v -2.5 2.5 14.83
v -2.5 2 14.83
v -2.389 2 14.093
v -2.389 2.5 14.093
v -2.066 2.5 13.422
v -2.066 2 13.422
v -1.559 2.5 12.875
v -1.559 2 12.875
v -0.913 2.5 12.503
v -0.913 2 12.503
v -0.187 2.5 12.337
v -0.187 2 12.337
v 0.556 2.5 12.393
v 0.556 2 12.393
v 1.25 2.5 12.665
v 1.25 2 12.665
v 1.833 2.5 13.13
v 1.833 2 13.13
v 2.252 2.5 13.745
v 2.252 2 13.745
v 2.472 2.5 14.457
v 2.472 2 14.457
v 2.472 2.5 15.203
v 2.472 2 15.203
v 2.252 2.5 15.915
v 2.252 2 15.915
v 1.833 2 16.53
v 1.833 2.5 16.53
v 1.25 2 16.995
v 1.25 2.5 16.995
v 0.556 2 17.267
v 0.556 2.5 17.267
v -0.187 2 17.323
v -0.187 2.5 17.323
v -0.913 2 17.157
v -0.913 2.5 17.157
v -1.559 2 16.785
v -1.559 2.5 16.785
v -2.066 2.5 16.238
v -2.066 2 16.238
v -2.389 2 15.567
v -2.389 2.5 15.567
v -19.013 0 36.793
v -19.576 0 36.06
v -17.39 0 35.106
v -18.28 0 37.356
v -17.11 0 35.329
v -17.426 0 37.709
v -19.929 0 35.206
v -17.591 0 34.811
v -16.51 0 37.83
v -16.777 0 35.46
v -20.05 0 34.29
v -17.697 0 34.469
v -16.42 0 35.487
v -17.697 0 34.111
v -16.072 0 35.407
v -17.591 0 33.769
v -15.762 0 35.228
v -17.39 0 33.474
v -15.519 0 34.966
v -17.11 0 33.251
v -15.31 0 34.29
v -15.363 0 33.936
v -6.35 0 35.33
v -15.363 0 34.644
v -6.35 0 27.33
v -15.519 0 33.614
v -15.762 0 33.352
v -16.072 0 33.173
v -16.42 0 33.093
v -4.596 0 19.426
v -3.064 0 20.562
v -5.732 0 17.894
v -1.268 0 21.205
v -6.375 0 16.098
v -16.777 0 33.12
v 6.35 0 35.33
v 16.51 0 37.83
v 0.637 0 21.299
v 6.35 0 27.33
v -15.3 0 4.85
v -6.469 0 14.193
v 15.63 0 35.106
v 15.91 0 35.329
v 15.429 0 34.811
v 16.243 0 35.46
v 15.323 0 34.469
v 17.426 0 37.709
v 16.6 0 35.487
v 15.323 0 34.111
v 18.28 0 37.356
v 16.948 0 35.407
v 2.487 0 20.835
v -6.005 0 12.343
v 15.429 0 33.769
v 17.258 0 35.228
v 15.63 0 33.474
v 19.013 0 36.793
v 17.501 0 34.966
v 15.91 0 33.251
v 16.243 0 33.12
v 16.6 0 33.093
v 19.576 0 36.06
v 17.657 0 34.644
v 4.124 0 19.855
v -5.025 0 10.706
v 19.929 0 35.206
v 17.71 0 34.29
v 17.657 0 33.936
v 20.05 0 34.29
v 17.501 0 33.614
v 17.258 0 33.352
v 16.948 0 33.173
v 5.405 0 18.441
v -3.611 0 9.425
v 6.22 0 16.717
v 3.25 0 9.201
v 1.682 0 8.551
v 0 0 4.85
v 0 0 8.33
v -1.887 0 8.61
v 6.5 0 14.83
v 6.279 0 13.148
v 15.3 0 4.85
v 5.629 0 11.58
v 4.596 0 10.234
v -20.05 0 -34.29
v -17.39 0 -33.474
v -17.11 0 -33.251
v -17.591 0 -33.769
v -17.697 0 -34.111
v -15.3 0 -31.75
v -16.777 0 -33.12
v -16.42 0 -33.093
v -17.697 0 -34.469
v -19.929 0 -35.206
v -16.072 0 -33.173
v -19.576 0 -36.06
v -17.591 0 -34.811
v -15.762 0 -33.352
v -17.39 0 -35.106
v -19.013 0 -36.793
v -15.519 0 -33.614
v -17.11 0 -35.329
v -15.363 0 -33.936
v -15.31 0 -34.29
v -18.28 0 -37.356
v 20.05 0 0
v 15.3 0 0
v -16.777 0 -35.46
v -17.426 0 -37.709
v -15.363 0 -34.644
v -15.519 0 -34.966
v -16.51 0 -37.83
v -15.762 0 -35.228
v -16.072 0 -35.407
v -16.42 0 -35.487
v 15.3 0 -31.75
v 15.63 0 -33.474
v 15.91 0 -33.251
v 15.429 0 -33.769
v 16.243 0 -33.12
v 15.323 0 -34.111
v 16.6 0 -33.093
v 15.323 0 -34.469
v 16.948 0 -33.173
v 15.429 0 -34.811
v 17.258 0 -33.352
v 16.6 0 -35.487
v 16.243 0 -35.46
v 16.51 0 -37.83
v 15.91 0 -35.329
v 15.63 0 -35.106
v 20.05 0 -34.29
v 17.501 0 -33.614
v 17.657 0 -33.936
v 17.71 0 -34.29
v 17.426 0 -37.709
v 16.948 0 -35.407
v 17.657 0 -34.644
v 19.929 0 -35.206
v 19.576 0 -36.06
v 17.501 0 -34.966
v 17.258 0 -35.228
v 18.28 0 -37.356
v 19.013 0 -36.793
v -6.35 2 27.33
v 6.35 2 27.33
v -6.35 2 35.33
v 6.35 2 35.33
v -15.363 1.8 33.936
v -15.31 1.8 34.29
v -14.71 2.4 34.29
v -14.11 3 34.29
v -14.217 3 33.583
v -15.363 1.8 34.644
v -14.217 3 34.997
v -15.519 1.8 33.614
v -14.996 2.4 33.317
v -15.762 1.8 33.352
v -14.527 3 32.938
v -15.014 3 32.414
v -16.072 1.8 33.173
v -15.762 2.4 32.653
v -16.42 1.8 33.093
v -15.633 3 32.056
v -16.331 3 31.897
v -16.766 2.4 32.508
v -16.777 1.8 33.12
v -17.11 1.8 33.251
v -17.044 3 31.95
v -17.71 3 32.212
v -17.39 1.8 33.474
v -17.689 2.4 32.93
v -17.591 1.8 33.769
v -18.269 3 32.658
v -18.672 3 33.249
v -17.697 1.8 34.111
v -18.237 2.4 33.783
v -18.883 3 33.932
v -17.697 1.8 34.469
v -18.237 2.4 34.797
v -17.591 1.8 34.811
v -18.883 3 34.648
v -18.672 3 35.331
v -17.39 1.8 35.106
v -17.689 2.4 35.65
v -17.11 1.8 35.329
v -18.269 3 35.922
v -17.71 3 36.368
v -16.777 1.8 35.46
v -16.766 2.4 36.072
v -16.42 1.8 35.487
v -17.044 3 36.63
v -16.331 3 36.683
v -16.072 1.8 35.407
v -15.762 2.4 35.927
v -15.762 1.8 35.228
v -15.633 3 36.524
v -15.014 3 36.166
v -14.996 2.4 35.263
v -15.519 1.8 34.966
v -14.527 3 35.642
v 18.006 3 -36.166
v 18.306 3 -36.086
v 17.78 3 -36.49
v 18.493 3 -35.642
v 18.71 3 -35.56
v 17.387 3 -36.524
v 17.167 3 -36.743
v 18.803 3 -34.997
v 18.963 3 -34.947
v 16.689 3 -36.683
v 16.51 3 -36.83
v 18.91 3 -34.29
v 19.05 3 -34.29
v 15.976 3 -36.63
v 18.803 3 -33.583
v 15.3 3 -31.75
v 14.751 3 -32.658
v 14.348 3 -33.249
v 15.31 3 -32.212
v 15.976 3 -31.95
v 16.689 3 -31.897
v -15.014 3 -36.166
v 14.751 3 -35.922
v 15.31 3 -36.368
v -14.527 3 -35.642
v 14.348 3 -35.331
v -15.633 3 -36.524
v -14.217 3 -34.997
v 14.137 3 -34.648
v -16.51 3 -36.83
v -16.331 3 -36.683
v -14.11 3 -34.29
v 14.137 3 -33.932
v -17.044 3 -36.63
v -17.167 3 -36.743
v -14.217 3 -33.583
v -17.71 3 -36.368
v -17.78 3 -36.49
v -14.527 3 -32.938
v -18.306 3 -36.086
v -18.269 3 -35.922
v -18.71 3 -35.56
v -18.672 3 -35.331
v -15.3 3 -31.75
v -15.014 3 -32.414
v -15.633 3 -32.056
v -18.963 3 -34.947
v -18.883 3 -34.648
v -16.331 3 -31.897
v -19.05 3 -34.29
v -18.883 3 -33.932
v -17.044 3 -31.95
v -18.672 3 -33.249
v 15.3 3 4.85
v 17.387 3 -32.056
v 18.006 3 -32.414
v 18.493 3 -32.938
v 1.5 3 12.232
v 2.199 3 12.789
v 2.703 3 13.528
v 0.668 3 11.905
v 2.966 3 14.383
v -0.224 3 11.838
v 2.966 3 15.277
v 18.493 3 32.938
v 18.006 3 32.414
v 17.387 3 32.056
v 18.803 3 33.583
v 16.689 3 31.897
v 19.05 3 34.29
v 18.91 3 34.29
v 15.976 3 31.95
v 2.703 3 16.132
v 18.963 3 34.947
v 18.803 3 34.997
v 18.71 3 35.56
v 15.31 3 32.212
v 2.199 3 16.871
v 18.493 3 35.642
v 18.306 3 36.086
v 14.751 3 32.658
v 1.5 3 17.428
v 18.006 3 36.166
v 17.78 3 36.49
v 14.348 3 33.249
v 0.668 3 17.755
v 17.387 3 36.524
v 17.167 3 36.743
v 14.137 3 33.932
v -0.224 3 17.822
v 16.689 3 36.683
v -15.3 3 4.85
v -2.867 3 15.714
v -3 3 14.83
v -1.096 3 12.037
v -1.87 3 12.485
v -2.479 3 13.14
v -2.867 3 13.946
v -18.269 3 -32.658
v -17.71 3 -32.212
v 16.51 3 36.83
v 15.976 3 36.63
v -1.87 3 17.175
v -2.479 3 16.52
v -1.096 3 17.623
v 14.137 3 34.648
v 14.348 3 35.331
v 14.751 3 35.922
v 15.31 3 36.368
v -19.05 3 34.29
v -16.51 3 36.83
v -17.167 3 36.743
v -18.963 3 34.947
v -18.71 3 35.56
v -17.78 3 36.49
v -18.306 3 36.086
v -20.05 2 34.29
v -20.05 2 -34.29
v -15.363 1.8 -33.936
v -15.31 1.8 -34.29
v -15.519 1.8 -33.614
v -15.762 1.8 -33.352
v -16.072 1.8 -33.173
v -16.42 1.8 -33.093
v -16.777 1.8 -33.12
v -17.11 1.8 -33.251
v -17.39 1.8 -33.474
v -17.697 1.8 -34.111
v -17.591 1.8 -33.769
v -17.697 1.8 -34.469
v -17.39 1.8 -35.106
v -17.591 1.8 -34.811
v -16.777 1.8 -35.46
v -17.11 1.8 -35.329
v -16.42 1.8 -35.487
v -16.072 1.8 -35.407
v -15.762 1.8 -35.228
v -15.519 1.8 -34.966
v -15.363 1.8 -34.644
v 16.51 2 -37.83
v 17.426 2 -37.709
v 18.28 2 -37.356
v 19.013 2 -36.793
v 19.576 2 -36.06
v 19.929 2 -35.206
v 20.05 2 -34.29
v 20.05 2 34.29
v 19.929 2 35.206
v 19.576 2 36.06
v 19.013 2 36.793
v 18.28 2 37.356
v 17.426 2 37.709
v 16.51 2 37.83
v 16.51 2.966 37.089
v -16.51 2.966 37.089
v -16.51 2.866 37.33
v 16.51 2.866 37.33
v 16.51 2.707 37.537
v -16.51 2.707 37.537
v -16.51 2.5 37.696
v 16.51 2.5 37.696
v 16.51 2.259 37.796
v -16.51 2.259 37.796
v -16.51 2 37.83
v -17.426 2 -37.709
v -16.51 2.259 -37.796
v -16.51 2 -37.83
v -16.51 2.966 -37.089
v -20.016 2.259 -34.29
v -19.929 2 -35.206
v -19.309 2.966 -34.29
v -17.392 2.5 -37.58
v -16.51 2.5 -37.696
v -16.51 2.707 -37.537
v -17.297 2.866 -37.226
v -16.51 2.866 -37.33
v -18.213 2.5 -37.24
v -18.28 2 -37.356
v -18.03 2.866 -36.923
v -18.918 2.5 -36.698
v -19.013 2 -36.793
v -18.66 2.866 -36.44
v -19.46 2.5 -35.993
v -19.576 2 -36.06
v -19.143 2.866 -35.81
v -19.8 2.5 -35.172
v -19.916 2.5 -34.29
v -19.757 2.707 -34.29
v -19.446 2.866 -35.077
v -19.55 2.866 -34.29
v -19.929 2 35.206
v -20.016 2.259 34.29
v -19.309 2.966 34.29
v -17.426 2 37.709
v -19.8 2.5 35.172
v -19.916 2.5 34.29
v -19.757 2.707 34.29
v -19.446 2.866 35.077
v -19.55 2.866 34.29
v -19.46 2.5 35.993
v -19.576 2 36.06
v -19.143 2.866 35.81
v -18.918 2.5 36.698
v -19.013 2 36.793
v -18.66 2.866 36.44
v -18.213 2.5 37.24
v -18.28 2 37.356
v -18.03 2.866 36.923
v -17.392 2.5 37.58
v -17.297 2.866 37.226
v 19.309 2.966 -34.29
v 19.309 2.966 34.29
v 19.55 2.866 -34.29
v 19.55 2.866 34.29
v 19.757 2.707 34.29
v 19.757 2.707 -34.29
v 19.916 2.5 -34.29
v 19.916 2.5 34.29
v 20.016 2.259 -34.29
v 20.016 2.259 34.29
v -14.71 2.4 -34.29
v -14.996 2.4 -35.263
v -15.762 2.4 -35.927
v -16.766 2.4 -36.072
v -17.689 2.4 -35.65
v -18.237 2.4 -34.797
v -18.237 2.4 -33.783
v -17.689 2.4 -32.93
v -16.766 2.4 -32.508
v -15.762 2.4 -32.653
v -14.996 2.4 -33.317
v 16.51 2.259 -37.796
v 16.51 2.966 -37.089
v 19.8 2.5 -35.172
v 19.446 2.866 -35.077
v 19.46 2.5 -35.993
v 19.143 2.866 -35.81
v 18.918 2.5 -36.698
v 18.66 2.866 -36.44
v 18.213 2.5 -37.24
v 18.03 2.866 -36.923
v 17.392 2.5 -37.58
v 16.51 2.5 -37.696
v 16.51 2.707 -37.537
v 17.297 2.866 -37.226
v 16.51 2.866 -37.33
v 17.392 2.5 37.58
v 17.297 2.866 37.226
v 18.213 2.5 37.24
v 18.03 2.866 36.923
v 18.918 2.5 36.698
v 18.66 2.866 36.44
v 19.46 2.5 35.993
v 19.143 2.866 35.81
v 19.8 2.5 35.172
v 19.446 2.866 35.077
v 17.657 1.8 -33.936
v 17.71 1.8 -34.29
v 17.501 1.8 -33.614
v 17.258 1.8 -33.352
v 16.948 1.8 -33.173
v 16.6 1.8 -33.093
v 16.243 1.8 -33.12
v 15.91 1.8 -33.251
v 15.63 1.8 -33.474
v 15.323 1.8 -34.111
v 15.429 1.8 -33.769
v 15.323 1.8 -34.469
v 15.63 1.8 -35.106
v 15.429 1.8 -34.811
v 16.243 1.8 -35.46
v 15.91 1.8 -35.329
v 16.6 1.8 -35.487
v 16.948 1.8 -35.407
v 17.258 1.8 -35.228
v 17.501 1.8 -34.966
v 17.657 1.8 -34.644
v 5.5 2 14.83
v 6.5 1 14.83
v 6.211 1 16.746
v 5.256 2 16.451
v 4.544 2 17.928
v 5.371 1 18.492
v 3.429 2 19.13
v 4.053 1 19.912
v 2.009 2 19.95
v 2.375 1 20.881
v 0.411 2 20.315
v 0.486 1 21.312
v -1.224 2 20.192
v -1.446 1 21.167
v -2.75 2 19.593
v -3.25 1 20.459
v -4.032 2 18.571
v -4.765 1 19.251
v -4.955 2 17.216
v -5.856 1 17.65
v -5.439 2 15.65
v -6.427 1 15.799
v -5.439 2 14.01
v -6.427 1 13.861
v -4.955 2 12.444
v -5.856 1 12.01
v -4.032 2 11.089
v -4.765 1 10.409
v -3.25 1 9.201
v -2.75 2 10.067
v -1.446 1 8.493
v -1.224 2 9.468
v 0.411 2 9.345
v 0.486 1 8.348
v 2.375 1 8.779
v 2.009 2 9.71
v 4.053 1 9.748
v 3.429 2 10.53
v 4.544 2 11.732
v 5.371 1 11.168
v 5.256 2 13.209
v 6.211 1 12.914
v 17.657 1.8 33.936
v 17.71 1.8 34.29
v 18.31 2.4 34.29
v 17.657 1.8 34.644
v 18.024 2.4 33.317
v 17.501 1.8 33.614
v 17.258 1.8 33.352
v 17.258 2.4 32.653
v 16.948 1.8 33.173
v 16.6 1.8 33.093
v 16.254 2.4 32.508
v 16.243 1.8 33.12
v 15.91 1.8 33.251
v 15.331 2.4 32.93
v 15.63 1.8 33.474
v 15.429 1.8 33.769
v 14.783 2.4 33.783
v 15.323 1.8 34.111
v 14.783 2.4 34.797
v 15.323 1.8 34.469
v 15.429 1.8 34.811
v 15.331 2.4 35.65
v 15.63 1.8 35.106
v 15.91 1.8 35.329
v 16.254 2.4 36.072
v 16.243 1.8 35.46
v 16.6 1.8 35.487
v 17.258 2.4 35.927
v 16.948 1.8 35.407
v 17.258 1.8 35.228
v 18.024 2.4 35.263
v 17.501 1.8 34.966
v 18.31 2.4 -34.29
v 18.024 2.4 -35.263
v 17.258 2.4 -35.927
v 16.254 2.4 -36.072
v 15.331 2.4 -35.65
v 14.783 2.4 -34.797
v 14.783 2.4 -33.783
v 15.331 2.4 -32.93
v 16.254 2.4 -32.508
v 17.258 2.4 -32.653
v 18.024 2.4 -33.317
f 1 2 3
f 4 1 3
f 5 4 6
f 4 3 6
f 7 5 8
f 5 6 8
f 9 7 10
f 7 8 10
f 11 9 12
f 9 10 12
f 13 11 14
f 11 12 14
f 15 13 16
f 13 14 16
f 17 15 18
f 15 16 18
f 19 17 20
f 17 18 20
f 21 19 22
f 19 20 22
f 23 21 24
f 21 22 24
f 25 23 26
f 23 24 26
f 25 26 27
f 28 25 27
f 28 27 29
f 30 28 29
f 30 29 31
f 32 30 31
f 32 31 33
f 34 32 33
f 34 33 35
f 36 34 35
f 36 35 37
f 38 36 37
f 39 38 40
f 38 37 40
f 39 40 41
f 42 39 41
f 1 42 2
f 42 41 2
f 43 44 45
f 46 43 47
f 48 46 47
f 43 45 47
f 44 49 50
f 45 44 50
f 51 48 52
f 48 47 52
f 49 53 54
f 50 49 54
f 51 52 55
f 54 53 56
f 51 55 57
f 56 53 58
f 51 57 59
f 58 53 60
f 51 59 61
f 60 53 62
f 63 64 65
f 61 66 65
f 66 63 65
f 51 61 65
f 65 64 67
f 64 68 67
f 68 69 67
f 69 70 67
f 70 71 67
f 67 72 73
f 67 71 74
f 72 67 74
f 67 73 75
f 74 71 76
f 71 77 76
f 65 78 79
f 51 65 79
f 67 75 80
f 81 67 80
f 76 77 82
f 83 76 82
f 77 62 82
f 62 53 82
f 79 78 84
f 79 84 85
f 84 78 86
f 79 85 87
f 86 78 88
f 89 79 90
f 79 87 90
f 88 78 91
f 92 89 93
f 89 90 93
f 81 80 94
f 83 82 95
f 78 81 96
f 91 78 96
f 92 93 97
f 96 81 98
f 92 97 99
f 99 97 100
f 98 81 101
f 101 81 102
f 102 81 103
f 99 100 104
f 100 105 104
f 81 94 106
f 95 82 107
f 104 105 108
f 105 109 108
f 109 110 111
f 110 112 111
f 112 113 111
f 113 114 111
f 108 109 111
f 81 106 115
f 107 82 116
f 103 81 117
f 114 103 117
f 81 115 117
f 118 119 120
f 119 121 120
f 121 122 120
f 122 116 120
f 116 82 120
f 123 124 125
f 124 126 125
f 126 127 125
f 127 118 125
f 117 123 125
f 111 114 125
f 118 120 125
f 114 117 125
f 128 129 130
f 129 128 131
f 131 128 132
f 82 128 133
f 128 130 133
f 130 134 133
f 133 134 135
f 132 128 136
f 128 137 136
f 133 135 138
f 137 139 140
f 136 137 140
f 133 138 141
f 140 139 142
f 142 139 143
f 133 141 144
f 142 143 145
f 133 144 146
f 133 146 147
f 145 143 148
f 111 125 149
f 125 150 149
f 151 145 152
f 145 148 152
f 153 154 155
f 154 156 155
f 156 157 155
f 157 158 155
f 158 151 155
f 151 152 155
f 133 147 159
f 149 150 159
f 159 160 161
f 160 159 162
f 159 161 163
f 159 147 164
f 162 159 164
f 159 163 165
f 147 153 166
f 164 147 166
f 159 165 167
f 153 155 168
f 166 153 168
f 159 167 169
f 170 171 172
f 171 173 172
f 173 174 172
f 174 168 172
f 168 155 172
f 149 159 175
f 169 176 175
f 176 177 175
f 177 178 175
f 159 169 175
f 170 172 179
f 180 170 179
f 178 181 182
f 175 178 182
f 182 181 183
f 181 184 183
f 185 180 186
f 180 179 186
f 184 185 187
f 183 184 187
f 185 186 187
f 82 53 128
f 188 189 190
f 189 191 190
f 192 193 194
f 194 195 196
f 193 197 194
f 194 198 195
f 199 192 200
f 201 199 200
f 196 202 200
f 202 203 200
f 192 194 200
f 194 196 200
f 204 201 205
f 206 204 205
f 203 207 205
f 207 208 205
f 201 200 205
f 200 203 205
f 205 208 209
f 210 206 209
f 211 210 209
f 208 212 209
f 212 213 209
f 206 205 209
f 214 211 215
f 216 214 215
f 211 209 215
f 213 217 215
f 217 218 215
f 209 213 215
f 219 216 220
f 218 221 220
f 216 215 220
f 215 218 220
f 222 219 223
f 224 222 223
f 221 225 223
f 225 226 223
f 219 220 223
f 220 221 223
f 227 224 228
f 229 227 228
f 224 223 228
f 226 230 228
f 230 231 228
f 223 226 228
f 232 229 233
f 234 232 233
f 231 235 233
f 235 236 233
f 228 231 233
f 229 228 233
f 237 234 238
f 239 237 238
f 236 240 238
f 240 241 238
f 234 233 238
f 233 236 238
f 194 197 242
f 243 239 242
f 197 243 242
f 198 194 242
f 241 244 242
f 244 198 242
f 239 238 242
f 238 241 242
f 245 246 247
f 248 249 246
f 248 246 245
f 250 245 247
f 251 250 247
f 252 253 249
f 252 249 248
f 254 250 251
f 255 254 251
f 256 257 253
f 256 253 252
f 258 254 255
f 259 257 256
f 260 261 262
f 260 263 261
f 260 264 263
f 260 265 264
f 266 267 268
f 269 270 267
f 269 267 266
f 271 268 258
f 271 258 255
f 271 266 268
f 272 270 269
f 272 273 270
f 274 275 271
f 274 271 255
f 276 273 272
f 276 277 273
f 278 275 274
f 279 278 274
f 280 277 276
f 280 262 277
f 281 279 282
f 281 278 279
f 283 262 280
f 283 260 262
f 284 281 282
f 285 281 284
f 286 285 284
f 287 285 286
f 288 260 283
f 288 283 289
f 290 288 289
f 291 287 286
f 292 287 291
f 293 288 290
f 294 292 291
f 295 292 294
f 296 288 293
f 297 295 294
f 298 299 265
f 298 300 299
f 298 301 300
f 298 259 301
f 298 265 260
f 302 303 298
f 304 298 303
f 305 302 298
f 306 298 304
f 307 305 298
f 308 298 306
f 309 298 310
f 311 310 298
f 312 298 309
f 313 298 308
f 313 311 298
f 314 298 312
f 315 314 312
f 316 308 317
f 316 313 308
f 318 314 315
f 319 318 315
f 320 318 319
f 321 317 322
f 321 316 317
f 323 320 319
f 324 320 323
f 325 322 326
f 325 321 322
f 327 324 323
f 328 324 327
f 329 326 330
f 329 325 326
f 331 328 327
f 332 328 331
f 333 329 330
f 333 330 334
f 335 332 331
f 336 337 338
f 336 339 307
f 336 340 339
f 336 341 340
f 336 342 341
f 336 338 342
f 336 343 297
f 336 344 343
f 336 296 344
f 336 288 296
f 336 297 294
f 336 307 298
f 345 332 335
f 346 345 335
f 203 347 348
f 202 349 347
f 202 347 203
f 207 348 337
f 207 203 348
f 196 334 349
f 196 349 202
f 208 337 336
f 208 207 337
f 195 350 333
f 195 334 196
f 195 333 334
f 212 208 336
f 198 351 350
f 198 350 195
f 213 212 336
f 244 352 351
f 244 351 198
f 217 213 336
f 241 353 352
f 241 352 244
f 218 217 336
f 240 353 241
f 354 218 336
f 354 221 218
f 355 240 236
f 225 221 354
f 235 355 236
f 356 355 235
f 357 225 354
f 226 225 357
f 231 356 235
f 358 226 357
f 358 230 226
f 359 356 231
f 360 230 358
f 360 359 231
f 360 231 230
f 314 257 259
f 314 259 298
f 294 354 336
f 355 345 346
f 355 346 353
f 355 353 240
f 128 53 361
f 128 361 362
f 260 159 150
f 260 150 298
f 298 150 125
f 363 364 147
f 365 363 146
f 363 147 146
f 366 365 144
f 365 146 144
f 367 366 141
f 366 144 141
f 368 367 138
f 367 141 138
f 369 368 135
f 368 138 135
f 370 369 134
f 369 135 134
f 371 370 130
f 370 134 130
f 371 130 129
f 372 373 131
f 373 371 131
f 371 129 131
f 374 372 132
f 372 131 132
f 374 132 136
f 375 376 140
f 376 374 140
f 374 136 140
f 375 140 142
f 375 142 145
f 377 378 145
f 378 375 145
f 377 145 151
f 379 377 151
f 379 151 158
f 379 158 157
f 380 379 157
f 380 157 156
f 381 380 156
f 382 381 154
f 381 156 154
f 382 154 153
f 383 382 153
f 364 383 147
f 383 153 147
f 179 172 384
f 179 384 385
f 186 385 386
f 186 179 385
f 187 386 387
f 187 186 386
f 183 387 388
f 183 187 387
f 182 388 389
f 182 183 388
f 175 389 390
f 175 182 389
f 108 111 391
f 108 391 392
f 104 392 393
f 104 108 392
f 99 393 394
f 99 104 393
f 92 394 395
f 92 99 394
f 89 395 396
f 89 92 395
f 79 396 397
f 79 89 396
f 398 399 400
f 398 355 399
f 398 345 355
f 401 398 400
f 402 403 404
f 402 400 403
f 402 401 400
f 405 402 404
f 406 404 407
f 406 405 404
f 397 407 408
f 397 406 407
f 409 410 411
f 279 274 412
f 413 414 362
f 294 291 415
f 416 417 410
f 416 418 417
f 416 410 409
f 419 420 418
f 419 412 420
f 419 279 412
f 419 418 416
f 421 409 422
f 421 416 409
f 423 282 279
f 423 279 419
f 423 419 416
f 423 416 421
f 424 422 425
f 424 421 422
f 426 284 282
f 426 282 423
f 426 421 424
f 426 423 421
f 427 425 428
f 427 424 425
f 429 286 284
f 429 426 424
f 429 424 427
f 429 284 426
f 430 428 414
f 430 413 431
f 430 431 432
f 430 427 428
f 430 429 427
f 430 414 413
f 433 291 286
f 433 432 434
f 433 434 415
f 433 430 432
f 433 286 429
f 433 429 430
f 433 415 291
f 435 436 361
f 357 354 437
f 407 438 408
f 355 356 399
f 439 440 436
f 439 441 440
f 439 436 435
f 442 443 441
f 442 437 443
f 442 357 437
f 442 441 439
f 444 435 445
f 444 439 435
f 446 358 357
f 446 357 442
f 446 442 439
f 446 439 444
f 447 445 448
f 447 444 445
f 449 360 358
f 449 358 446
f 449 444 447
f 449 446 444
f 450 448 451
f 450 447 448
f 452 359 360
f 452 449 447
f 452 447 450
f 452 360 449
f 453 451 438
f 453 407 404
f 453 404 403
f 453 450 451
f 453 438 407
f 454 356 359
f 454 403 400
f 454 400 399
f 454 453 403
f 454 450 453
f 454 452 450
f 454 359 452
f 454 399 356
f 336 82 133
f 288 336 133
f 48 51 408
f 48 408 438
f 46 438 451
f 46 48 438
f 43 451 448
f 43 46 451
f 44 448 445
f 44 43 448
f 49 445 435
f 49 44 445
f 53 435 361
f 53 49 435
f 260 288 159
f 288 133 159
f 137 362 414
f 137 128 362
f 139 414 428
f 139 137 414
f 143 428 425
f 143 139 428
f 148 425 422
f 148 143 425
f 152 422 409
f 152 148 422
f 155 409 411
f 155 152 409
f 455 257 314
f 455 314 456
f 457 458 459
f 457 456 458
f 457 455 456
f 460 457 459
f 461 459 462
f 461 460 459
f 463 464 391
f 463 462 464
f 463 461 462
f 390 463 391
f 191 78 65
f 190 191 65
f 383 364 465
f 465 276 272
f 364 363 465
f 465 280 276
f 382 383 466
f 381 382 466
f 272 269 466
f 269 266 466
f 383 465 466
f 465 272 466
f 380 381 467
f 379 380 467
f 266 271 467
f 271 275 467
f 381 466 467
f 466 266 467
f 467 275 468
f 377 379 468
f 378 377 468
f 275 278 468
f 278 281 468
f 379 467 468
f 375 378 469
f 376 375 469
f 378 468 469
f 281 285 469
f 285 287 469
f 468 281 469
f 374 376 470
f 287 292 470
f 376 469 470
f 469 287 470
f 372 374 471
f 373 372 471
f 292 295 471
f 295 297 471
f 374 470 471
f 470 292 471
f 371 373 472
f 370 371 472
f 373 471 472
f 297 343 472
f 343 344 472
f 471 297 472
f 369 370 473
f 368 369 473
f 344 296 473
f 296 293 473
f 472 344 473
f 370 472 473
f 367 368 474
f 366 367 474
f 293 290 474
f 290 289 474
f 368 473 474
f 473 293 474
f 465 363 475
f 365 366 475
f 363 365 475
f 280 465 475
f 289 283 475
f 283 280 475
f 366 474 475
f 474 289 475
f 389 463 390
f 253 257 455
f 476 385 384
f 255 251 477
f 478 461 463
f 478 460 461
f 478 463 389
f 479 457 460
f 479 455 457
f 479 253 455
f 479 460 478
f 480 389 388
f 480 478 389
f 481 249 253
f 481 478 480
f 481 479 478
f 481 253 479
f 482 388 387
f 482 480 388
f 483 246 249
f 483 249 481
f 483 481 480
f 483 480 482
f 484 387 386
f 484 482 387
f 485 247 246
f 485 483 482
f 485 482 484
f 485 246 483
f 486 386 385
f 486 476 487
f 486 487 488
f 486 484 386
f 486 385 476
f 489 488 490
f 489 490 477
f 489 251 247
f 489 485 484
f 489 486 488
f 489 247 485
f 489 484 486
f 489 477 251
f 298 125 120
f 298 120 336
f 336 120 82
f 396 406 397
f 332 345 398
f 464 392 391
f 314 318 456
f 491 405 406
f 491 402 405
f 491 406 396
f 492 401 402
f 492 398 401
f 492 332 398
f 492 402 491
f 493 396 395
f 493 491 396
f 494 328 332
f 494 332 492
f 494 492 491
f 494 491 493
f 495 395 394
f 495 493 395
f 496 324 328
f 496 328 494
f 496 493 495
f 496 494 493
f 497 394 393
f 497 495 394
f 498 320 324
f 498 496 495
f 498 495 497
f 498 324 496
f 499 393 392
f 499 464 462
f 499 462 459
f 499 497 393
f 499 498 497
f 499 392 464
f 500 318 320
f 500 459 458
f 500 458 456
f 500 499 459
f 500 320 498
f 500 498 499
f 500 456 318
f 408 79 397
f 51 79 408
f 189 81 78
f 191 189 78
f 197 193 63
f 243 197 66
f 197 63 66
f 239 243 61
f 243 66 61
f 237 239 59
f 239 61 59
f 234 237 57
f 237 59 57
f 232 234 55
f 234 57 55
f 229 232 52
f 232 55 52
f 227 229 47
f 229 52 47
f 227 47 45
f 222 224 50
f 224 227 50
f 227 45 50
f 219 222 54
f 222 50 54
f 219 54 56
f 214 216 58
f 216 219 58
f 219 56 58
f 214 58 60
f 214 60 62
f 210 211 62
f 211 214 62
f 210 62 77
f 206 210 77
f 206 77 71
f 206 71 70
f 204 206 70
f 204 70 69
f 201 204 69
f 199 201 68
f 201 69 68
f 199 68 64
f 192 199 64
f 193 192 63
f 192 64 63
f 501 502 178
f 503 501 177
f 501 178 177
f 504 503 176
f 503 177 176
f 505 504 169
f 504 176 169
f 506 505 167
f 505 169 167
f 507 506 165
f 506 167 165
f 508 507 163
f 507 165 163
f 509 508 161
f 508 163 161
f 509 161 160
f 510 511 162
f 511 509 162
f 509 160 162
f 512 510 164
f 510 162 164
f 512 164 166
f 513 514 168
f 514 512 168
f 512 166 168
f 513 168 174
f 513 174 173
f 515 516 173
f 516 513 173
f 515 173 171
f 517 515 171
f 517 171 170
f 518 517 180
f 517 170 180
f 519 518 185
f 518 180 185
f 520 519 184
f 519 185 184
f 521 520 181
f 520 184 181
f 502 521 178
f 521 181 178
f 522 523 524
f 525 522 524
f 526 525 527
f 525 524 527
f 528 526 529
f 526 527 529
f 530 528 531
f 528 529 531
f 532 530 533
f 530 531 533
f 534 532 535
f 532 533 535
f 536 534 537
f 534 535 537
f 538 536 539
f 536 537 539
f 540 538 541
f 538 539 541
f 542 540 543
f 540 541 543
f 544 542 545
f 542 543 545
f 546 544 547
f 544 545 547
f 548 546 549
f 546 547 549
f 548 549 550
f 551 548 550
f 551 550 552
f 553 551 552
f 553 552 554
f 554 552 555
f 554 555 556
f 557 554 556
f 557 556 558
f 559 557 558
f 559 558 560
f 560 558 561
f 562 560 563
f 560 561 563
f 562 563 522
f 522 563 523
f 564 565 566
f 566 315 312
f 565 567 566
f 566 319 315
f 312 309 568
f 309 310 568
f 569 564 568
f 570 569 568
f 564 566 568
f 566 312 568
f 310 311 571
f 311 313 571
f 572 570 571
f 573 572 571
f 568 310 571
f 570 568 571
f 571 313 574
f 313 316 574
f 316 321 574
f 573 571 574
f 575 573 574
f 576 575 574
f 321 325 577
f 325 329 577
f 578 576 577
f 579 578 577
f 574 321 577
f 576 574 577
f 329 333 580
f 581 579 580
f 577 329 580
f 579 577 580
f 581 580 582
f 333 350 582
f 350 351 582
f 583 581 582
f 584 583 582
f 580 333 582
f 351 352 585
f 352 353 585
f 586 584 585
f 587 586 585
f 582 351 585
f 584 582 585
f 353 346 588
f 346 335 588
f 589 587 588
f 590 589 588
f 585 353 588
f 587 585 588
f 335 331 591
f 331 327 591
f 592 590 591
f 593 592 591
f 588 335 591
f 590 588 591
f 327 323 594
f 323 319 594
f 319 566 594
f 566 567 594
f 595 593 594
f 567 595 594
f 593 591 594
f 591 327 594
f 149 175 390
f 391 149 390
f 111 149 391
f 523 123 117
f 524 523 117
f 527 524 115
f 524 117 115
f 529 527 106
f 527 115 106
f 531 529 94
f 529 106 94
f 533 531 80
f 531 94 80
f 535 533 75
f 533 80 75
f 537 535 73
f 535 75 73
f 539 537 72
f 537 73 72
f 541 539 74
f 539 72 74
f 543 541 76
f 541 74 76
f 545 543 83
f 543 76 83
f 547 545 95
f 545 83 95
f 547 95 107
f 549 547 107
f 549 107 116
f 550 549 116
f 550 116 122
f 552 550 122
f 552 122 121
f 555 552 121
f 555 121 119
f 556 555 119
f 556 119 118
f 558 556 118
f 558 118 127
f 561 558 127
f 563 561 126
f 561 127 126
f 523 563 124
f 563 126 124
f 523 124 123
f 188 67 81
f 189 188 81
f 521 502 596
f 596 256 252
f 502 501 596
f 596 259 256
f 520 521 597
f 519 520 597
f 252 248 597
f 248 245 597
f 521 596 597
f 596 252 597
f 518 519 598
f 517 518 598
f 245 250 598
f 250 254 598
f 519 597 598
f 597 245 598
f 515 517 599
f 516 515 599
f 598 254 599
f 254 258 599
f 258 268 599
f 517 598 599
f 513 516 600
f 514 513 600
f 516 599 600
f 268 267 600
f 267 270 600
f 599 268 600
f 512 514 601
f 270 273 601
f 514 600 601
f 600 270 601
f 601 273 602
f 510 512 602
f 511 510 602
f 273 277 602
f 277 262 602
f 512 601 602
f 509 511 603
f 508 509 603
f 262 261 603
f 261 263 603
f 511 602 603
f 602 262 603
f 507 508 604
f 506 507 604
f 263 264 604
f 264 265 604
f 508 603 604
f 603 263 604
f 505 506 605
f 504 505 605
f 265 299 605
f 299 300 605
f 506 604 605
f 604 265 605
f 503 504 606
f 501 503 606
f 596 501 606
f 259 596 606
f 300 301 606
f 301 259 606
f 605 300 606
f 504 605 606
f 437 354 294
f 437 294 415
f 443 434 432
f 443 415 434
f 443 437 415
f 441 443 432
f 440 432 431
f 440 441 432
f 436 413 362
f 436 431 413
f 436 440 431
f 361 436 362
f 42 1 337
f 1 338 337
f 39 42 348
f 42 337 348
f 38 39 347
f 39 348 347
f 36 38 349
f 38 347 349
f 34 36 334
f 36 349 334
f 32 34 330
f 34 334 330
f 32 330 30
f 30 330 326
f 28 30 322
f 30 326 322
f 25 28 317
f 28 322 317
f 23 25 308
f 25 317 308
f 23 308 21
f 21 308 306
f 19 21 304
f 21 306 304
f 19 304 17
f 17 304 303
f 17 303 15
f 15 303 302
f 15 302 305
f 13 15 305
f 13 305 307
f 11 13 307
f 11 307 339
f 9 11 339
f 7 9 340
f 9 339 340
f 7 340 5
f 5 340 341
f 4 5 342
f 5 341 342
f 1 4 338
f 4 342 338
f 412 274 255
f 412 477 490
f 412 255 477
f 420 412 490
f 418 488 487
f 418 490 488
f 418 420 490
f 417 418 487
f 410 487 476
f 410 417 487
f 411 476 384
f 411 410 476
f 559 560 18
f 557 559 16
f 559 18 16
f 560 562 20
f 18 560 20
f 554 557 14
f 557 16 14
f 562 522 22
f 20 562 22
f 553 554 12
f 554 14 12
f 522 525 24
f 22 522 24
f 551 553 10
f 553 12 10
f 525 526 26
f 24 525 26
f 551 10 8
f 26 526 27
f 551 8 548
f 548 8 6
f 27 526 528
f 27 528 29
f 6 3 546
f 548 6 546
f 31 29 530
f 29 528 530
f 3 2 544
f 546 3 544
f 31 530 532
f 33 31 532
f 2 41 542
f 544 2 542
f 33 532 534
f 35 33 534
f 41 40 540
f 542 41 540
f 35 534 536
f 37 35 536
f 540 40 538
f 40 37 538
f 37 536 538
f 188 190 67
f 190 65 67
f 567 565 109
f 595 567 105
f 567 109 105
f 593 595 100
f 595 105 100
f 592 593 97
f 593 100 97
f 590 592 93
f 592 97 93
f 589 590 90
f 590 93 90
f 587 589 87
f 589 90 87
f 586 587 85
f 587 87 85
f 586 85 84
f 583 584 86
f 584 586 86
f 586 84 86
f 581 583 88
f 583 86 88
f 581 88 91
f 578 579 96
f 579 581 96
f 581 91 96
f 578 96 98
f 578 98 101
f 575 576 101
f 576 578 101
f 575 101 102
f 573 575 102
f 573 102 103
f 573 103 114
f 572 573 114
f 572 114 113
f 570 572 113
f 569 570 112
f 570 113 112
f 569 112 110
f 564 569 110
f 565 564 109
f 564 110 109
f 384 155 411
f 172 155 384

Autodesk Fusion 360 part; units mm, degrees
sketch "Skizze1" plane through (0, 0, 0) normal (0, 1, 0) x (1, 0, 0)
  line L0 (1.75, 0) -> (22.5, 0)
  line L1 (0, -1.75) -> (0, -22.5)
  line L2 (-16.51, 36.83) -> (16.51, 36.83)
  line L3 (19.05, 34.29) -> (19.05, -34.29)
  line L4 (16.51, -36.83) -> (-16.51, -36.83)
  line L5 (-19.05, -34.29) -> (-19.05, 34.29)
  arc A0 (-16.51, 36.83) -> (-19.05, 34.29) centre (-16.51, 34.29) ccw
  arc A1 (19.05, 34.29) -> (16.51, 36.83) centre (16.51, 34.29) ccw
  arc A2 (16.51, -36.83) -> (19.05, -34.29) centre (16.51, -34.29) ccw
  arc A3 (-19.05, -34.29) -> (-16.51, -36.83) centre (-16.51, -34.29) ccw
  arc A4 (20.05, 34.29) -> (16.51, 37.83) centre (16.51, 34.29) ccw
  line L6 (-16.51, 37.83) -> (16.51, 37.83)
  arc A5 (-16.51, 37.83) -> (-20.05, 34.29) centre (-16.51, 34.29) ccw
  line L7 (-20.05, -34.29) -> (-20.05, 34.29)
  arc A6 (-20.05, -34.29) -> (-16.51, -37.83) centre (-16.51, -34.29) ccw
  line L8 (16.51, -37.83) -> (-16.51, -37.83)
  arc A7 (16.51, -37.83) -> (20.05, -34.29) centre (16.51, -34.29) ccw
  line L9 (20.05, 34.29) -> (20.05, -34.29)
  line L10 (-15.3, 31.75) -> (15.3, 31.75)
  line L11 (15.3, 31.75) -> (15.3, -4.85)
  line L12 (15.3, -4.85) -> (-15.3, -4.85)
  line L13 (-15.3, -4.85) -> (-15.3, 31.75)
  circle A8 centre (-16.51, 34.29) radius 1.2
  circle A9 centre (16.51, 34.29) radius 1.2
  circle A10 centre (-16.51, -34.29) radius 1.2
  circle A11 centre (16.51, -34.29) radius 1.2
  circle A12 centre (0, -14.83) radius 6.5
  line L14 (-6.35, -27.33) -> (6.35, -27.33)
  line L15 (6.35, -27.33) -> (6.35, -35.33)
  line L16 (6.35, -35.33) -> (-6.35, -35.33)
  line L17 (-6.35, -35.33) -> (-6.35, -27.33)
  point P0 (-19.05, 36.83)
  point P1 (19.05, 36.83)
  point P2 (-19.05, -36.83)
  dimension "d1" = 73.66
  dimension "d2" = 38.1
  dimension "d3" = 2.54
  dimension "d4" = -1
  dimension "d5" = 30.6
  dimension "d6" = 5.08
  dimension "d7" = 2.4
  dimension "d8" = 36.6
  dimension "d9" = 8
  dimension "d10" = 12.7
  dimension "d11" = 1.5
  dimension "d12" = 22
  dimension "d13" = 13
extrude "Extrusion1" add sketch "Skizze1" along normal blind 2 contours L2 L3 L4 L5 A0 A1 A2 A3 | A4 L6 A5 L7 A6 L8 A7 L9
sketch "Skizze2" plane through (0, 2, 0) normal (0, 1, 0) x (-1, 0, 0)
  circle A0 centre (16.51, -34.29) radius 1.2
  line L0 (-6.35, 35.33) -> (6.35, 35.33)
  line L1 (6.35, 35.33) -> (6.35, 27.33)
  line L2 (6.35, 27.33) -> (-6.35, 27.33)
  line L3 (-6.35, 27.33) -> (-6.35, 35.33)
  circle A1 centre (-16.51, 34.29) radius 1.2
  circle A2 centre (-16.51, -34.29) radius 1.2
  circle A3 centre (16.51, 34.29) radius 1.2
  line L4 (-15.3, 4.85) -> (15.3, 4.85)
  line L5 (15.3, 4.85) -> (15.3, -31.75)
  line L6 (15.3, -31.75) -> (-15.3, -31.75)
  line L7 (-15.3, -31.75) -> (-15.3, 4.85)
  circle A4 centre (0, 14.83) radius 6.5
  arc A5 (16.51, -37.83) -> (20.05, -34.29) centre (16.51, -34.29) ccw
  line L8 (20.05, -34.29) -> (20.05, 34.29)
  arc A6 (20.05, 34.29) -> (16.51, 37.83) centre (16.51, 34.29) ccw
  line L9 (16.51, 37.83) -> (-16.51, 37.83)
  arc A7 (-16.51, 37.83) -> (-20.05, 34.29) centre (-16.51, 34.29) ccw
  line L10 (-20.05, 34.29) -> (-20.05, -34.29)
  arc A8 (-20.05, -34.29) -> (-16.51, -37.83) centre (-16.51, -34.29) ccw
  line L11 (-16.51, -37.83) -> (16.51, -37.83)
  circle A9 centre (0, 14.83) radius 2.5
  dimension "d16" = 5
extrude "Extrusion2" add sketch "Skizze2" along normal blind 1 contours L0 L1 L2 L3 | A4 | A5 L8 A6 L9 A7 L10 A8 L11
fillet "Abrundung1" radius 1 8 edges at (0, 3, 37.83) (19.0132, 3, 36.7932) (20.05, 3, 0) (19.0132, 3, -36.7932) (0, 3, -37.83) (-19.0132, 3, -36.7932) (-20.05, 3, 0) (-19.0132, 3, 36.7932)
chamfer "Fase1" distance 1.2 angle 45 4 edges at (-15.3912, 3, 34.7239) (17.6288, 3, 34.7239) (-15.3912, 3, -33.8561) (17.6288, 3, -33.8561)
chamfer "Fase2" distance 1 angle 45 1 edges at (-6.0601, 2, 12.4795)
chamfer "Fase3" distance 0.5 angle 45 1 edges at (2.3308, 3, 15.734)
equation "d5 = 30.1 mm + 0.5 mm"
equation "d6 = ( 2.54 * 2 ) * 1 mm"
